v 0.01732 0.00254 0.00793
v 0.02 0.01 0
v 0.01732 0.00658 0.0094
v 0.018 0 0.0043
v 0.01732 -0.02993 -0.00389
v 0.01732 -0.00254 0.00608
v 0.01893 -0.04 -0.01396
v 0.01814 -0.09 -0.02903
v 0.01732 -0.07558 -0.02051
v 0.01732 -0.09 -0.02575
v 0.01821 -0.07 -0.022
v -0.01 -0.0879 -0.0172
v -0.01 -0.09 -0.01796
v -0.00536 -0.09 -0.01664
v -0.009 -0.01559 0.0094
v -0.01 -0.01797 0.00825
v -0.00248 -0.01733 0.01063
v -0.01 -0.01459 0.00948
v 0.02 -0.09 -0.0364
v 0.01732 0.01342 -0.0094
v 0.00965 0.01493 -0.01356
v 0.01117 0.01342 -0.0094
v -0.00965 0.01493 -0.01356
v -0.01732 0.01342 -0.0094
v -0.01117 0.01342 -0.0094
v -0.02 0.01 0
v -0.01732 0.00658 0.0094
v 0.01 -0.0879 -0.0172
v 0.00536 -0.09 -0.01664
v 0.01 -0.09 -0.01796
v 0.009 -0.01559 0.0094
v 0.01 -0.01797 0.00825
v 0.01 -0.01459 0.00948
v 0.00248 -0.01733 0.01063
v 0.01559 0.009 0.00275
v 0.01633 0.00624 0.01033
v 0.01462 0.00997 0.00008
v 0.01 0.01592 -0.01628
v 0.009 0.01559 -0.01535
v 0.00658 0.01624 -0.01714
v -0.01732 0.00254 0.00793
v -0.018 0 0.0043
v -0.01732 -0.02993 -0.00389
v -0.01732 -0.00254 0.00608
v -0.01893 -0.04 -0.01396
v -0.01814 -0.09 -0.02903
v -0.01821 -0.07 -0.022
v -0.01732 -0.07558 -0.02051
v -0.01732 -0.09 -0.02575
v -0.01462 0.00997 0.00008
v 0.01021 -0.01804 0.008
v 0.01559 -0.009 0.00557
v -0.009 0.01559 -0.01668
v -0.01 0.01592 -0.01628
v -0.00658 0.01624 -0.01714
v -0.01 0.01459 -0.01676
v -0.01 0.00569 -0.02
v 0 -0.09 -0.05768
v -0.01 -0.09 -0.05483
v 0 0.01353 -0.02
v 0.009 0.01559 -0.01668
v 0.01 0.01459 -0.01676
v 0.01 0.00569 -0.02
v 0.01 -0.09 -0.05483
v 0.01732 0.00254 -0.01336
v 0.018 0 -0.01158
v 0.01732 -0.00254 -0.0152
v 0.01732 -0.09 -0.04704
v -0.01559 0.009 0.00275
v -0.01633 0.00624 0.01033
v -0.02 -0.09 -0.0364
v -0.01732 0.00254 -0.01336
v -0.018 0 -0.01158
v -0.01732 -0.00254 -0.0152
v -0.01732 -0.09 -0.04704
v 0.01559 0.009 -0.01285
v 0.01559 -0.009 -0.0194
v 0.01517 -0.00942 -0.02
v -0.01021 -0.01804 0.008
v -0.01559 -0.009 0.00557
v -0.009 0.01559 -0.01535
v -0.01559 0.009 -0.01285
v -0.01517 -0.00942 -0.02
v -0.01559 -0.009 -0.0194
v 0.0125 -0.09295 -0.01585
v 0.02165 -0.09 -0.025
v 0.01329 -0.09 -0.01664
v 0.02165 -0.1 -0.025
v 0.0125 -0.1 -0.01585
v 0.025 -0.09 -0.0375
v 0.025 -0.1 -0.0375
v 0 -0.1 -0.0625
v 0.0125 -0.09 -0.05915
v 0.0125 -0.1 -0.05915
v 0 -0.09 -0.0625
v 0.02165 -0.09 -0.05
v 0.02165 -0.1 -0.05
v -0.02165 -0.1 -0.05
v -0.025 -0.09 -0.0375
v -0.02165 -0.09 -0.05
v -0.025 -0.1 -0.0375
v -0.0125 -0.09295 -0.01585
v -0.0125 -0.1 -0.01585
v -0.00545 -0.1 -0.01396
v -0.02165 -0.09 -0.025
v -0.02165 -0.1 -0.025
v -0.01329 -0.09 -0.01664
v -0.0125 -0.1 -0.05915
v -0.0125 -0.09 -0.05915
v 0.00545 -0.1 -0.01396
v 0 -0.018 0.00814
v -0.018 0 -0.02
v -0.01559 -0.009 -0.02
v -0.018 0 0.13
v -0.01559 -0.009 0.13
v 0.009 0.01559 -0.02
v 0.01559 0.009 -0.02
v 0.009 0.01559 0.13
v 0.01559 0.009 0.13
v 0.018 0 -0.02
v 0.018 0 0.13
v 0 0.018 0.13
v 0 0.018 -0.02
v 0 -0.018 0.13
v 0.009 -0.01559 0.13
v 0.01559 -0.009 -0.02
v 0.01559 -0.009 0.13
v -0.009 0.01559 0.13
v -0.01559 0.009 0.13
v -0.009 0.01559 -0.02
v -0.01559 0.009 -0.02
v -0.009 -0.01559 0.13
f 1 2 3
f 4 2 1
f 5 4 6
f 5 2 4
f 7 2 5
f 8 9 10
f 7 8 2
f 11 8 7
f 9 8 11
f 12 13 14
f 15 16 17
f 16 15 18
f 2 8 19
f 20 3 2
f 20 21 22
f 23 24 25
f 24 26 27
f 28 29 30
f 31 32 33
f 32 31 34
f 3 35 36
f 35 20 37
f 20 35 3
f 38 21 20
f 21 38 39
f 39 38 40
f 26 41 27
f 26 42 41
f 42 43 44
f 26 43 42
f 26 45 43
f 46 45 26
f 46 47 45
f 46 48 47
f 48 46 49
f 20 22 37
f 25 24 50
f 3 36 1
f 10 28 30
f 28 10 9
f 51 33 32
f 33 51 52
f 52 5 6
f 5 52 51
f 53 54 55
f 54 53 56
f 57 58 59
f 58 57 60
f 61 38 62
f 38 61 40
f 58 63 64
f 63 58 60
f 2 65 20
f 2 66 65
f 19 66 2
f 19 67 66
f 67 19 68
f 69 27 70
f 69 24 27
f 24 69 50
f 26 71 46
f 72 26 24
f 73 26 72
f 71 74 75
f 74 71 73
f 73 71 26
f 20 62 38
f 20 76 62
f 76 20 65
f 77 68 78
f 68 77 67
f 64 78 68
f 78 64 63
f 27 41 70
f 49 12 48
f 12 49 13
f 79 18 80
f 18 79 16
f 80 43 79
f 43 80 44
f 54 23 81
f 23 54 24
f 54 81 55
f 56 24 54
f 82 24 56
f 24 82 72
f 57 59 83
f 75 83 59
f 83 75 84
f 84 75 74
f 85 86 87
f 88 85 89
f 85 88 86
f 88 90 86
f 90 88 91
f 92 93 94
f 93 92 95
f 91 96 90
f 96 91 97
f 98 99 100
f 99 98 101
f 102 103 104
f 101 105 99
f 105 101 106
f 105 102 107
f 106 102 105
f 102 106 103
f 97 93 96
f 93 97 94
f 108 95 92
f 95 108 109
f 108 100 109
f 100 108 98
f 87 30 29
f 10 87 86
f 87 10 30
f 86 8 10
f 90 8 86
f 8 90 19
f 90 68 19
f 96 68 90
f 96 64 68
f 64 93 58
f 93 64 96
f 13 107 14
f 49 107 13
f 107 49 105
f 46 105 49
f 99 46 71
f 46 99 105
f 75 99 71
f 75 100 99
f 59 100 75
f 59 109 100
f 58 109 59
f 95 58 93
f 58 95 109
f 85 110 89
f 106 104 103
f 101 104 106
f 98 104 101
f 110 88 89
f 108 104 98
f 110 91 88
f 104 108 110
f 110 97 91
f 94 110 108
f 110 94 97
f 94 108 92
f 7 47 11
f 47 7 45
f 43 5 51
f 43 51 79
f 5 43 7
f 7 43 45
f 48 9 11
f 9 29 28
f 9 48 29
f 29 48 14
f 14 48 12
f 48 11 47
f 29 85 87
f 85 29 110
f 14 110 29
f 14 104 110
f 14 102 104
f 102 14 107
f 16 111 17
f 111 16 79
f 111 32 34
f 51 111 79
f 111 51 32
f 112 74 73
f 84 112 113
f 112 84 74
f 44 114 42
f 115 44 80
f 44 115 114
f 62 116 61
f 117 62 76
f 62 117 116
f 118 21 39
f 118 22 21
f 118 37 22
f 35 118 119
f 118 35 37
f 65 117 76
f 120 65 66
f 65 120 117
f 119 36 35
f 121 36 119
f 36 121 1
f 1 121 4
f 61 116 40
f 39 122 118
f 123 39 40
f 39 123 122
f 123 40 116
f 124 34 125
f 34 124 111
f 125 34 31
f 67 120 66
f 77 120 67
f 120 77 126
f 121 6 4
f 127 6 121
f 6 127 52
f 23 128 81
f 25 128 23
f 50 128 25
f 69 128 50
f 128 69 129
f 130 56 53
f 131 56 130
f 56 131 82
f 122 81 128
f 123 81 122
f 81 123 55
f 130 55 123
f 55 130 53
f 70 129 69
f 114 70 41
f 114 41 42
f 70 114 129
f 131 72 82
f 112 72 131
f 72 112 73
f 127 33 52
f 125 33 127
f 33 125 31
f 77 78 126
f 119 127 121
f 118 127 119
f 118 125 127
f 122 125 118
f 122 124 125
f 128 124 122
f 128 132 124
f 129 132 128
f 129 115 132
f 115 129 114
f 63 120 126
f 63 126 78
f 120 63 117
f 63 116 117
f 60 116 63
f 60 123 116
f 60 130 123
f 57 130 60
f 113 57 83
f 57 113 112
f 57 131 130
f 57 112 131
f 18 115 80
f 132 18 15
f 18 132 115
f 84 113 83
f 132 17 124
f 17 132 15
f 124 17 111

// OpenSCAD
// handle
difference() {
    union() {
        translate([0, 0.01, 0]) {
            rotate([110, 0, 0]) {
                cylinder(h = 0.15,
                         r1 = 0.02,
                         r2 = 0.02,
                         center = false, $fn=12);
            }
        }
        // edge at bottom of handle
        translate([0, -0.09, -0.0375]) {
            rotate([90, 0, 0]) {
                cylinder(h = 0.1,
                         r1 = 0.025,
                         r2 = 0.025,
                         center = false, $fn=12);
            }
        }
    }


    union() {
        translate([-0.5, -1.1, -0.5]) {
            cube([1, 1, 1]);
        }
        // cutout curve of handle
        translate([0, -0.07, 0.038]) {
            rotate([0, 90, 0]) {
                cylinder(h = 0.1,
                         r1 = 0.06,
                         r2 = 0.06,
                         center = true, $fn=12);
            }
        }
    }
}

// main barrel
translate([0, 0, -0.02]) {
    cylinder(h = 0.15,
             r1 = 0.018,
             r2 = 0.018,
             center = false, $fn=12);
}
